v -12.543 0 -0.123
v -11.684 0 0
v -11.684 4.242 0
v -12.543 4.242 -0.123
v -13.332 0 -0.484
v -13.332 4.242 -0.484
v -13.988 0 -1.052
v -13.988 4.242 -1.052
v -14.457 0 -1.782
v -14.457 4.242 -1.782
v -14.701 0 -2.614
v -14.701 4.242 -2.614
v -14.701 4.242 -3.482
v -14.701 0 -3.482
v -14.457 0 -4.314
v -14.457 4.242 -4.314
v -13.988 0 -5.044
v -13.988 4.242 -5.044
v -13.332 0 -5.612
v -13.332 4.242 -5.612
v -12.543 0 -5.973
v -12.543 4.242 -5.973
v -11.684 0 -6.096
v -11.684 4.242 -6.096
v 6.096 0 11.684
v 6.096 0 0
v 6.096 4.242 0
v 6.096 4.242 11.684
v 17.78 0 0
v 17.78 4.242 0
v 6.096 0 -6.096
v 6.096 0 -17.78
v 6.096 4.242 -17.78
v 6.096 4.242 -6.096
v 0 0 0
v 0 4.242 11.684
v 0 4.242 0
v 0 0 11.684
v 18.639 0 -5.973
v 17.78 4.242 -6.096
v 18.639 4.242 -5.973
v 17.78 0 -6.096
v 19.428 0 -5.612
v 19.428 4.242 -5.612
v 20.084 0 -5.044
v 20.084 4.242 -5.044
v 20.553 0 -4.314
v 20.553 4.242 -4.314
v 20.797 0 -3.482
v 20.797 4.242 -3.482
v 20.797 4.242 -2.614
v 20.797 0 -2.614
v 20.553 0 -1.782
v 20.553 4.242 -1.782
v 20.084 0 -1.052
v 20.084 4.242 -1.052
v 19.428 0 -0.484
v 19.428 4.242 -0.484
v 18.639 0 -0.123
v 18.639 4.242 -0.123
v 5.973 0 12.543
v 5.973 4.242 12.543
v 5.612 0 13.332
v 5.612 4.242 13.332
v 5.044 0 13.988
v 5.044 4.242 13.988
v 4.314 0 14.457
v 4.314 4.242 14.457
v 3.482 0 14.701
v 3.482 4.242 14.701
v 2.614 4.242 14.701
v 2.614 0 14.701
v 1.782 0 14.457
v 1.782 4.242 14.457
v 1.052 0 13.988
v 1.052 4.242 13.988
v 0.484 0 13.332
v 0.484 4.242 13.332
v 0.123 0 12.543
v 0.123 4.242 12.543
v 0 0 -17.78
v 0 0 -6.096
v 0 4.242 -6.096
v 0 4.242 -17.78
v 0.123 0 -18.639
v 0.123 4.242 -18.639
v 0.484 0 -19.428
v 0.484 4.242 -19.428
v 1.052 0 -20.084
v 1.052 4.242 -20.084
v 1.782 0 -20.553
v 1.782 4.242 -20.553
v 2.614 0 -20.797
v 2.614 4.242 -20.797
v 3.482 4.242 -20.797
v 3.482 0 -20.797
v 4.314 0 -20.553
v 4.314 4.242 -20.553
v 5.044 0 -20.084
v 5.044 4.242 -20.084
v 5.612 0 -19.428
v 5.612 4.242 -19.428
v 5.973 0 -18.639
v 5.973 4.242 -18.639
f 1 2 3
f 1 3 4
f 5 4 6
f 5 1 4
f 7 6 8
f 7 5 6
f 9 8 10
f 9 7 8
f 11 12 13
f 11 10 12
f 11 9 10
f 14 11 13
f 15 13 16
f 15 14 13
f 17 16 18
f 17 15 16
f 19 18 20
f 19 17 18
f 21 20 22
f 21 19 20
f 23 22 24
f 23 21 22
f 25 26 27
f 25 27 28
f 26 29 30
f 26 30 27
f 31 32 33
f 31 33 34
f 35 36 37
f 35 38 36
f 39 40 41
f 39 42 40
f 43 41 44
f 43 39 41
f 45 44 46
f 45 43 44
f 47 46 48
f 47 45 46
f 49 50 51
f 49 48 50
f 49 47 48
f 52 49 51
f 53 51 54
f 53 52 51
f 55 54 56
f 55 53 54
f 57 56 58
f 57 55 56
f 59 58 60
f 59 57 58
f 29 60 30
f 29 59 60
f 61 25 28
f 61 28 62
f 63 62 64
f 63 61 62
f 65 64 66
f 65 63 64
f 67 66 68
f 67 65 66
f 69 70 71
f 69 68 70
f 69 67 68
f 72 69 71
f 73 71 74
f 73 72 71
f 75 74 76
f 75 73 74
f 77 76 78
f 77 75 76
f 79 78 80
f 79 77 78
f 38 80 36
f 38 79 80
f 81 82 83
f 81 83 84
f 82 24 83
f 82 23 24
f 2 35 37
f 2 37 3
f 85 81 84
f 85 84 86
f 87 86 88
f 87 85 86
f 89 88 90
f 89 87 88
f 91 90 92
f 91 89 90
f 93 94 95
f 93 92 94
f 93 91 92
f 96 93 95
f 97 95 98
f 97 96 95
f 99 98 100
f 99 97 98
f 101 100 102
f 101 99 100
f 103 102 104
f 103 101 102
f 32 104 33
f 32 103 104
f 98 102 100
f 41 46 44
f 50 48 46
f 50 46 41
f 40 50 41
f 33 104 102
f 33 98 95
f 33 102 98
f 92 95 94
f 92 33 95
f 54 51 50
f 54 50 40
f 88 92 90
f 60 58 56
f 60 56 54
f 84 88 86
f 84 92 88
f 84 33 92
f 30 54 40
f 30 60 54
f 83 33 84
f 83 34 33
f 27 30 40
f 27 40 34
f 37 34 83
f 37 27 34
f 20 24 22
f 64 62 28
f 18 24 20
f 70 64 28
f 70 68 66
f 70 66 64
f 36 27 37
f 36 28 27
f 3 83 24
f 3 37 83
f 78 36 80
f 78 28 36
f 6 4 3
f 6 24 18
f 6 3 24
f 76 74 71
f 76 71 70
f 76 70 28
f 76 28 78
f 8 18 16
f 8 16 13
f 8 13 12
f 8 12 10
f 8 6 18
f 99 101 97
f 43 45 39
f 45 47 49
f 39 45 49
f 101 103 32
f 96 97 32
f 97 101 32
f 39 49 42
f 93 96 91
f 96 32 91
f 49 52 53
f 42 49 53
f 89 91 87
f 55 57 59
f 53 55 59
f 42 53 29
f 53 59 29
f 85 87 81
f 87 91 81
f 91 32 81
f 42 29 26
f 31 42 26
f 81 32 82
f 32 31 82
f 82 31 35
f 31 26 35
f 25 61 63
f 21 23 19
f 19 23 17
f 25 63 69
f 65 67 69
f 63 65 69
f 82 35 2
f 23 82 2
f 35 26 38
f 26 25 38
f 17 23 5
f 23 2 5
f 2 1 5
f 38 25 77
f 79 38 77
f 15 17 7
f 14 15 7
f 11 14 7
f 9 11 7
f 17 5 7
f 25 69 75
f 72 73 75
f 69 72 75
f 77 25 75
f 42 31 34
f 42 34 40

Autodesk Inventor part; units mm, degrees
ref_plane "YZ Plane" through (0, 0, 0) normal (1, 0, 0) x (0, 1, 0)
ref_plane "XZ Plane" through (0, 0, 0) normal (0, 1, 0) x (-1, 0, 0)
ref_plane "XY Plane" through (0, 0, 0) normal (0, 0, 1) x (1, 0, 0)
sketch "Sketch1" plane through (0, 0, 0) normal (0, 1, 0) x (-1, 0, 0)
  line L0 (0, 0) -> (11.684, 0)
  line L1 (11.684, 0) -> (11.684, -6.096)
  line L2 (11.684, -6.096) -> (0, -6.096)
  line L3 (0, -6.096) -> (0, -17.78)
  line L4 (0, -17.78) -> (-6.096, -17.78)
  line L5 (-6.096, -17.78) -> (-6.096, -6.096)
  line L6 (-6.096, -6.096) -> (-17.78, -6.096)
  line L7 (-17.78, -6.096) -> (-17.78, 0)
  line L8 (-17.78, 0) -> (-6.096, 0)
  line L9 (-6.096, 0) -> (-6.096, 11.684)
  line L10 (-6.096, 11.684) -> (0, 11.684)
  line L11 (0, 11.684) -> (0, 0)
  arc A0 (11.684, -6.096) -> (11.684, 0) centre (11.684, -3.048) ccw
  arc A1 (-6.096, -17.78) -> (0, -17.78) centre (-3.048, -17.78) ccw
  arc A2 (-17.78, 0) -> (-17.78, -6.096) centre (-17.78, -3.048) ccw
  arc A3 (0, 11.684) -> (-6.096, 11.684) centre (-3.048, 11.684) ccw
  dimension "d0" = 11.684
  dimension "d1" = 6.096
  dimension "d2" = 11.684
  dimension "d3" = 6.096
  dimension "d4" = 11.684
  dimension "d5" = 11.684
extrude "Extrusion1" add sketch "Sketch1" along normal blind 4.2418
properties part number "Part7 x 2"
